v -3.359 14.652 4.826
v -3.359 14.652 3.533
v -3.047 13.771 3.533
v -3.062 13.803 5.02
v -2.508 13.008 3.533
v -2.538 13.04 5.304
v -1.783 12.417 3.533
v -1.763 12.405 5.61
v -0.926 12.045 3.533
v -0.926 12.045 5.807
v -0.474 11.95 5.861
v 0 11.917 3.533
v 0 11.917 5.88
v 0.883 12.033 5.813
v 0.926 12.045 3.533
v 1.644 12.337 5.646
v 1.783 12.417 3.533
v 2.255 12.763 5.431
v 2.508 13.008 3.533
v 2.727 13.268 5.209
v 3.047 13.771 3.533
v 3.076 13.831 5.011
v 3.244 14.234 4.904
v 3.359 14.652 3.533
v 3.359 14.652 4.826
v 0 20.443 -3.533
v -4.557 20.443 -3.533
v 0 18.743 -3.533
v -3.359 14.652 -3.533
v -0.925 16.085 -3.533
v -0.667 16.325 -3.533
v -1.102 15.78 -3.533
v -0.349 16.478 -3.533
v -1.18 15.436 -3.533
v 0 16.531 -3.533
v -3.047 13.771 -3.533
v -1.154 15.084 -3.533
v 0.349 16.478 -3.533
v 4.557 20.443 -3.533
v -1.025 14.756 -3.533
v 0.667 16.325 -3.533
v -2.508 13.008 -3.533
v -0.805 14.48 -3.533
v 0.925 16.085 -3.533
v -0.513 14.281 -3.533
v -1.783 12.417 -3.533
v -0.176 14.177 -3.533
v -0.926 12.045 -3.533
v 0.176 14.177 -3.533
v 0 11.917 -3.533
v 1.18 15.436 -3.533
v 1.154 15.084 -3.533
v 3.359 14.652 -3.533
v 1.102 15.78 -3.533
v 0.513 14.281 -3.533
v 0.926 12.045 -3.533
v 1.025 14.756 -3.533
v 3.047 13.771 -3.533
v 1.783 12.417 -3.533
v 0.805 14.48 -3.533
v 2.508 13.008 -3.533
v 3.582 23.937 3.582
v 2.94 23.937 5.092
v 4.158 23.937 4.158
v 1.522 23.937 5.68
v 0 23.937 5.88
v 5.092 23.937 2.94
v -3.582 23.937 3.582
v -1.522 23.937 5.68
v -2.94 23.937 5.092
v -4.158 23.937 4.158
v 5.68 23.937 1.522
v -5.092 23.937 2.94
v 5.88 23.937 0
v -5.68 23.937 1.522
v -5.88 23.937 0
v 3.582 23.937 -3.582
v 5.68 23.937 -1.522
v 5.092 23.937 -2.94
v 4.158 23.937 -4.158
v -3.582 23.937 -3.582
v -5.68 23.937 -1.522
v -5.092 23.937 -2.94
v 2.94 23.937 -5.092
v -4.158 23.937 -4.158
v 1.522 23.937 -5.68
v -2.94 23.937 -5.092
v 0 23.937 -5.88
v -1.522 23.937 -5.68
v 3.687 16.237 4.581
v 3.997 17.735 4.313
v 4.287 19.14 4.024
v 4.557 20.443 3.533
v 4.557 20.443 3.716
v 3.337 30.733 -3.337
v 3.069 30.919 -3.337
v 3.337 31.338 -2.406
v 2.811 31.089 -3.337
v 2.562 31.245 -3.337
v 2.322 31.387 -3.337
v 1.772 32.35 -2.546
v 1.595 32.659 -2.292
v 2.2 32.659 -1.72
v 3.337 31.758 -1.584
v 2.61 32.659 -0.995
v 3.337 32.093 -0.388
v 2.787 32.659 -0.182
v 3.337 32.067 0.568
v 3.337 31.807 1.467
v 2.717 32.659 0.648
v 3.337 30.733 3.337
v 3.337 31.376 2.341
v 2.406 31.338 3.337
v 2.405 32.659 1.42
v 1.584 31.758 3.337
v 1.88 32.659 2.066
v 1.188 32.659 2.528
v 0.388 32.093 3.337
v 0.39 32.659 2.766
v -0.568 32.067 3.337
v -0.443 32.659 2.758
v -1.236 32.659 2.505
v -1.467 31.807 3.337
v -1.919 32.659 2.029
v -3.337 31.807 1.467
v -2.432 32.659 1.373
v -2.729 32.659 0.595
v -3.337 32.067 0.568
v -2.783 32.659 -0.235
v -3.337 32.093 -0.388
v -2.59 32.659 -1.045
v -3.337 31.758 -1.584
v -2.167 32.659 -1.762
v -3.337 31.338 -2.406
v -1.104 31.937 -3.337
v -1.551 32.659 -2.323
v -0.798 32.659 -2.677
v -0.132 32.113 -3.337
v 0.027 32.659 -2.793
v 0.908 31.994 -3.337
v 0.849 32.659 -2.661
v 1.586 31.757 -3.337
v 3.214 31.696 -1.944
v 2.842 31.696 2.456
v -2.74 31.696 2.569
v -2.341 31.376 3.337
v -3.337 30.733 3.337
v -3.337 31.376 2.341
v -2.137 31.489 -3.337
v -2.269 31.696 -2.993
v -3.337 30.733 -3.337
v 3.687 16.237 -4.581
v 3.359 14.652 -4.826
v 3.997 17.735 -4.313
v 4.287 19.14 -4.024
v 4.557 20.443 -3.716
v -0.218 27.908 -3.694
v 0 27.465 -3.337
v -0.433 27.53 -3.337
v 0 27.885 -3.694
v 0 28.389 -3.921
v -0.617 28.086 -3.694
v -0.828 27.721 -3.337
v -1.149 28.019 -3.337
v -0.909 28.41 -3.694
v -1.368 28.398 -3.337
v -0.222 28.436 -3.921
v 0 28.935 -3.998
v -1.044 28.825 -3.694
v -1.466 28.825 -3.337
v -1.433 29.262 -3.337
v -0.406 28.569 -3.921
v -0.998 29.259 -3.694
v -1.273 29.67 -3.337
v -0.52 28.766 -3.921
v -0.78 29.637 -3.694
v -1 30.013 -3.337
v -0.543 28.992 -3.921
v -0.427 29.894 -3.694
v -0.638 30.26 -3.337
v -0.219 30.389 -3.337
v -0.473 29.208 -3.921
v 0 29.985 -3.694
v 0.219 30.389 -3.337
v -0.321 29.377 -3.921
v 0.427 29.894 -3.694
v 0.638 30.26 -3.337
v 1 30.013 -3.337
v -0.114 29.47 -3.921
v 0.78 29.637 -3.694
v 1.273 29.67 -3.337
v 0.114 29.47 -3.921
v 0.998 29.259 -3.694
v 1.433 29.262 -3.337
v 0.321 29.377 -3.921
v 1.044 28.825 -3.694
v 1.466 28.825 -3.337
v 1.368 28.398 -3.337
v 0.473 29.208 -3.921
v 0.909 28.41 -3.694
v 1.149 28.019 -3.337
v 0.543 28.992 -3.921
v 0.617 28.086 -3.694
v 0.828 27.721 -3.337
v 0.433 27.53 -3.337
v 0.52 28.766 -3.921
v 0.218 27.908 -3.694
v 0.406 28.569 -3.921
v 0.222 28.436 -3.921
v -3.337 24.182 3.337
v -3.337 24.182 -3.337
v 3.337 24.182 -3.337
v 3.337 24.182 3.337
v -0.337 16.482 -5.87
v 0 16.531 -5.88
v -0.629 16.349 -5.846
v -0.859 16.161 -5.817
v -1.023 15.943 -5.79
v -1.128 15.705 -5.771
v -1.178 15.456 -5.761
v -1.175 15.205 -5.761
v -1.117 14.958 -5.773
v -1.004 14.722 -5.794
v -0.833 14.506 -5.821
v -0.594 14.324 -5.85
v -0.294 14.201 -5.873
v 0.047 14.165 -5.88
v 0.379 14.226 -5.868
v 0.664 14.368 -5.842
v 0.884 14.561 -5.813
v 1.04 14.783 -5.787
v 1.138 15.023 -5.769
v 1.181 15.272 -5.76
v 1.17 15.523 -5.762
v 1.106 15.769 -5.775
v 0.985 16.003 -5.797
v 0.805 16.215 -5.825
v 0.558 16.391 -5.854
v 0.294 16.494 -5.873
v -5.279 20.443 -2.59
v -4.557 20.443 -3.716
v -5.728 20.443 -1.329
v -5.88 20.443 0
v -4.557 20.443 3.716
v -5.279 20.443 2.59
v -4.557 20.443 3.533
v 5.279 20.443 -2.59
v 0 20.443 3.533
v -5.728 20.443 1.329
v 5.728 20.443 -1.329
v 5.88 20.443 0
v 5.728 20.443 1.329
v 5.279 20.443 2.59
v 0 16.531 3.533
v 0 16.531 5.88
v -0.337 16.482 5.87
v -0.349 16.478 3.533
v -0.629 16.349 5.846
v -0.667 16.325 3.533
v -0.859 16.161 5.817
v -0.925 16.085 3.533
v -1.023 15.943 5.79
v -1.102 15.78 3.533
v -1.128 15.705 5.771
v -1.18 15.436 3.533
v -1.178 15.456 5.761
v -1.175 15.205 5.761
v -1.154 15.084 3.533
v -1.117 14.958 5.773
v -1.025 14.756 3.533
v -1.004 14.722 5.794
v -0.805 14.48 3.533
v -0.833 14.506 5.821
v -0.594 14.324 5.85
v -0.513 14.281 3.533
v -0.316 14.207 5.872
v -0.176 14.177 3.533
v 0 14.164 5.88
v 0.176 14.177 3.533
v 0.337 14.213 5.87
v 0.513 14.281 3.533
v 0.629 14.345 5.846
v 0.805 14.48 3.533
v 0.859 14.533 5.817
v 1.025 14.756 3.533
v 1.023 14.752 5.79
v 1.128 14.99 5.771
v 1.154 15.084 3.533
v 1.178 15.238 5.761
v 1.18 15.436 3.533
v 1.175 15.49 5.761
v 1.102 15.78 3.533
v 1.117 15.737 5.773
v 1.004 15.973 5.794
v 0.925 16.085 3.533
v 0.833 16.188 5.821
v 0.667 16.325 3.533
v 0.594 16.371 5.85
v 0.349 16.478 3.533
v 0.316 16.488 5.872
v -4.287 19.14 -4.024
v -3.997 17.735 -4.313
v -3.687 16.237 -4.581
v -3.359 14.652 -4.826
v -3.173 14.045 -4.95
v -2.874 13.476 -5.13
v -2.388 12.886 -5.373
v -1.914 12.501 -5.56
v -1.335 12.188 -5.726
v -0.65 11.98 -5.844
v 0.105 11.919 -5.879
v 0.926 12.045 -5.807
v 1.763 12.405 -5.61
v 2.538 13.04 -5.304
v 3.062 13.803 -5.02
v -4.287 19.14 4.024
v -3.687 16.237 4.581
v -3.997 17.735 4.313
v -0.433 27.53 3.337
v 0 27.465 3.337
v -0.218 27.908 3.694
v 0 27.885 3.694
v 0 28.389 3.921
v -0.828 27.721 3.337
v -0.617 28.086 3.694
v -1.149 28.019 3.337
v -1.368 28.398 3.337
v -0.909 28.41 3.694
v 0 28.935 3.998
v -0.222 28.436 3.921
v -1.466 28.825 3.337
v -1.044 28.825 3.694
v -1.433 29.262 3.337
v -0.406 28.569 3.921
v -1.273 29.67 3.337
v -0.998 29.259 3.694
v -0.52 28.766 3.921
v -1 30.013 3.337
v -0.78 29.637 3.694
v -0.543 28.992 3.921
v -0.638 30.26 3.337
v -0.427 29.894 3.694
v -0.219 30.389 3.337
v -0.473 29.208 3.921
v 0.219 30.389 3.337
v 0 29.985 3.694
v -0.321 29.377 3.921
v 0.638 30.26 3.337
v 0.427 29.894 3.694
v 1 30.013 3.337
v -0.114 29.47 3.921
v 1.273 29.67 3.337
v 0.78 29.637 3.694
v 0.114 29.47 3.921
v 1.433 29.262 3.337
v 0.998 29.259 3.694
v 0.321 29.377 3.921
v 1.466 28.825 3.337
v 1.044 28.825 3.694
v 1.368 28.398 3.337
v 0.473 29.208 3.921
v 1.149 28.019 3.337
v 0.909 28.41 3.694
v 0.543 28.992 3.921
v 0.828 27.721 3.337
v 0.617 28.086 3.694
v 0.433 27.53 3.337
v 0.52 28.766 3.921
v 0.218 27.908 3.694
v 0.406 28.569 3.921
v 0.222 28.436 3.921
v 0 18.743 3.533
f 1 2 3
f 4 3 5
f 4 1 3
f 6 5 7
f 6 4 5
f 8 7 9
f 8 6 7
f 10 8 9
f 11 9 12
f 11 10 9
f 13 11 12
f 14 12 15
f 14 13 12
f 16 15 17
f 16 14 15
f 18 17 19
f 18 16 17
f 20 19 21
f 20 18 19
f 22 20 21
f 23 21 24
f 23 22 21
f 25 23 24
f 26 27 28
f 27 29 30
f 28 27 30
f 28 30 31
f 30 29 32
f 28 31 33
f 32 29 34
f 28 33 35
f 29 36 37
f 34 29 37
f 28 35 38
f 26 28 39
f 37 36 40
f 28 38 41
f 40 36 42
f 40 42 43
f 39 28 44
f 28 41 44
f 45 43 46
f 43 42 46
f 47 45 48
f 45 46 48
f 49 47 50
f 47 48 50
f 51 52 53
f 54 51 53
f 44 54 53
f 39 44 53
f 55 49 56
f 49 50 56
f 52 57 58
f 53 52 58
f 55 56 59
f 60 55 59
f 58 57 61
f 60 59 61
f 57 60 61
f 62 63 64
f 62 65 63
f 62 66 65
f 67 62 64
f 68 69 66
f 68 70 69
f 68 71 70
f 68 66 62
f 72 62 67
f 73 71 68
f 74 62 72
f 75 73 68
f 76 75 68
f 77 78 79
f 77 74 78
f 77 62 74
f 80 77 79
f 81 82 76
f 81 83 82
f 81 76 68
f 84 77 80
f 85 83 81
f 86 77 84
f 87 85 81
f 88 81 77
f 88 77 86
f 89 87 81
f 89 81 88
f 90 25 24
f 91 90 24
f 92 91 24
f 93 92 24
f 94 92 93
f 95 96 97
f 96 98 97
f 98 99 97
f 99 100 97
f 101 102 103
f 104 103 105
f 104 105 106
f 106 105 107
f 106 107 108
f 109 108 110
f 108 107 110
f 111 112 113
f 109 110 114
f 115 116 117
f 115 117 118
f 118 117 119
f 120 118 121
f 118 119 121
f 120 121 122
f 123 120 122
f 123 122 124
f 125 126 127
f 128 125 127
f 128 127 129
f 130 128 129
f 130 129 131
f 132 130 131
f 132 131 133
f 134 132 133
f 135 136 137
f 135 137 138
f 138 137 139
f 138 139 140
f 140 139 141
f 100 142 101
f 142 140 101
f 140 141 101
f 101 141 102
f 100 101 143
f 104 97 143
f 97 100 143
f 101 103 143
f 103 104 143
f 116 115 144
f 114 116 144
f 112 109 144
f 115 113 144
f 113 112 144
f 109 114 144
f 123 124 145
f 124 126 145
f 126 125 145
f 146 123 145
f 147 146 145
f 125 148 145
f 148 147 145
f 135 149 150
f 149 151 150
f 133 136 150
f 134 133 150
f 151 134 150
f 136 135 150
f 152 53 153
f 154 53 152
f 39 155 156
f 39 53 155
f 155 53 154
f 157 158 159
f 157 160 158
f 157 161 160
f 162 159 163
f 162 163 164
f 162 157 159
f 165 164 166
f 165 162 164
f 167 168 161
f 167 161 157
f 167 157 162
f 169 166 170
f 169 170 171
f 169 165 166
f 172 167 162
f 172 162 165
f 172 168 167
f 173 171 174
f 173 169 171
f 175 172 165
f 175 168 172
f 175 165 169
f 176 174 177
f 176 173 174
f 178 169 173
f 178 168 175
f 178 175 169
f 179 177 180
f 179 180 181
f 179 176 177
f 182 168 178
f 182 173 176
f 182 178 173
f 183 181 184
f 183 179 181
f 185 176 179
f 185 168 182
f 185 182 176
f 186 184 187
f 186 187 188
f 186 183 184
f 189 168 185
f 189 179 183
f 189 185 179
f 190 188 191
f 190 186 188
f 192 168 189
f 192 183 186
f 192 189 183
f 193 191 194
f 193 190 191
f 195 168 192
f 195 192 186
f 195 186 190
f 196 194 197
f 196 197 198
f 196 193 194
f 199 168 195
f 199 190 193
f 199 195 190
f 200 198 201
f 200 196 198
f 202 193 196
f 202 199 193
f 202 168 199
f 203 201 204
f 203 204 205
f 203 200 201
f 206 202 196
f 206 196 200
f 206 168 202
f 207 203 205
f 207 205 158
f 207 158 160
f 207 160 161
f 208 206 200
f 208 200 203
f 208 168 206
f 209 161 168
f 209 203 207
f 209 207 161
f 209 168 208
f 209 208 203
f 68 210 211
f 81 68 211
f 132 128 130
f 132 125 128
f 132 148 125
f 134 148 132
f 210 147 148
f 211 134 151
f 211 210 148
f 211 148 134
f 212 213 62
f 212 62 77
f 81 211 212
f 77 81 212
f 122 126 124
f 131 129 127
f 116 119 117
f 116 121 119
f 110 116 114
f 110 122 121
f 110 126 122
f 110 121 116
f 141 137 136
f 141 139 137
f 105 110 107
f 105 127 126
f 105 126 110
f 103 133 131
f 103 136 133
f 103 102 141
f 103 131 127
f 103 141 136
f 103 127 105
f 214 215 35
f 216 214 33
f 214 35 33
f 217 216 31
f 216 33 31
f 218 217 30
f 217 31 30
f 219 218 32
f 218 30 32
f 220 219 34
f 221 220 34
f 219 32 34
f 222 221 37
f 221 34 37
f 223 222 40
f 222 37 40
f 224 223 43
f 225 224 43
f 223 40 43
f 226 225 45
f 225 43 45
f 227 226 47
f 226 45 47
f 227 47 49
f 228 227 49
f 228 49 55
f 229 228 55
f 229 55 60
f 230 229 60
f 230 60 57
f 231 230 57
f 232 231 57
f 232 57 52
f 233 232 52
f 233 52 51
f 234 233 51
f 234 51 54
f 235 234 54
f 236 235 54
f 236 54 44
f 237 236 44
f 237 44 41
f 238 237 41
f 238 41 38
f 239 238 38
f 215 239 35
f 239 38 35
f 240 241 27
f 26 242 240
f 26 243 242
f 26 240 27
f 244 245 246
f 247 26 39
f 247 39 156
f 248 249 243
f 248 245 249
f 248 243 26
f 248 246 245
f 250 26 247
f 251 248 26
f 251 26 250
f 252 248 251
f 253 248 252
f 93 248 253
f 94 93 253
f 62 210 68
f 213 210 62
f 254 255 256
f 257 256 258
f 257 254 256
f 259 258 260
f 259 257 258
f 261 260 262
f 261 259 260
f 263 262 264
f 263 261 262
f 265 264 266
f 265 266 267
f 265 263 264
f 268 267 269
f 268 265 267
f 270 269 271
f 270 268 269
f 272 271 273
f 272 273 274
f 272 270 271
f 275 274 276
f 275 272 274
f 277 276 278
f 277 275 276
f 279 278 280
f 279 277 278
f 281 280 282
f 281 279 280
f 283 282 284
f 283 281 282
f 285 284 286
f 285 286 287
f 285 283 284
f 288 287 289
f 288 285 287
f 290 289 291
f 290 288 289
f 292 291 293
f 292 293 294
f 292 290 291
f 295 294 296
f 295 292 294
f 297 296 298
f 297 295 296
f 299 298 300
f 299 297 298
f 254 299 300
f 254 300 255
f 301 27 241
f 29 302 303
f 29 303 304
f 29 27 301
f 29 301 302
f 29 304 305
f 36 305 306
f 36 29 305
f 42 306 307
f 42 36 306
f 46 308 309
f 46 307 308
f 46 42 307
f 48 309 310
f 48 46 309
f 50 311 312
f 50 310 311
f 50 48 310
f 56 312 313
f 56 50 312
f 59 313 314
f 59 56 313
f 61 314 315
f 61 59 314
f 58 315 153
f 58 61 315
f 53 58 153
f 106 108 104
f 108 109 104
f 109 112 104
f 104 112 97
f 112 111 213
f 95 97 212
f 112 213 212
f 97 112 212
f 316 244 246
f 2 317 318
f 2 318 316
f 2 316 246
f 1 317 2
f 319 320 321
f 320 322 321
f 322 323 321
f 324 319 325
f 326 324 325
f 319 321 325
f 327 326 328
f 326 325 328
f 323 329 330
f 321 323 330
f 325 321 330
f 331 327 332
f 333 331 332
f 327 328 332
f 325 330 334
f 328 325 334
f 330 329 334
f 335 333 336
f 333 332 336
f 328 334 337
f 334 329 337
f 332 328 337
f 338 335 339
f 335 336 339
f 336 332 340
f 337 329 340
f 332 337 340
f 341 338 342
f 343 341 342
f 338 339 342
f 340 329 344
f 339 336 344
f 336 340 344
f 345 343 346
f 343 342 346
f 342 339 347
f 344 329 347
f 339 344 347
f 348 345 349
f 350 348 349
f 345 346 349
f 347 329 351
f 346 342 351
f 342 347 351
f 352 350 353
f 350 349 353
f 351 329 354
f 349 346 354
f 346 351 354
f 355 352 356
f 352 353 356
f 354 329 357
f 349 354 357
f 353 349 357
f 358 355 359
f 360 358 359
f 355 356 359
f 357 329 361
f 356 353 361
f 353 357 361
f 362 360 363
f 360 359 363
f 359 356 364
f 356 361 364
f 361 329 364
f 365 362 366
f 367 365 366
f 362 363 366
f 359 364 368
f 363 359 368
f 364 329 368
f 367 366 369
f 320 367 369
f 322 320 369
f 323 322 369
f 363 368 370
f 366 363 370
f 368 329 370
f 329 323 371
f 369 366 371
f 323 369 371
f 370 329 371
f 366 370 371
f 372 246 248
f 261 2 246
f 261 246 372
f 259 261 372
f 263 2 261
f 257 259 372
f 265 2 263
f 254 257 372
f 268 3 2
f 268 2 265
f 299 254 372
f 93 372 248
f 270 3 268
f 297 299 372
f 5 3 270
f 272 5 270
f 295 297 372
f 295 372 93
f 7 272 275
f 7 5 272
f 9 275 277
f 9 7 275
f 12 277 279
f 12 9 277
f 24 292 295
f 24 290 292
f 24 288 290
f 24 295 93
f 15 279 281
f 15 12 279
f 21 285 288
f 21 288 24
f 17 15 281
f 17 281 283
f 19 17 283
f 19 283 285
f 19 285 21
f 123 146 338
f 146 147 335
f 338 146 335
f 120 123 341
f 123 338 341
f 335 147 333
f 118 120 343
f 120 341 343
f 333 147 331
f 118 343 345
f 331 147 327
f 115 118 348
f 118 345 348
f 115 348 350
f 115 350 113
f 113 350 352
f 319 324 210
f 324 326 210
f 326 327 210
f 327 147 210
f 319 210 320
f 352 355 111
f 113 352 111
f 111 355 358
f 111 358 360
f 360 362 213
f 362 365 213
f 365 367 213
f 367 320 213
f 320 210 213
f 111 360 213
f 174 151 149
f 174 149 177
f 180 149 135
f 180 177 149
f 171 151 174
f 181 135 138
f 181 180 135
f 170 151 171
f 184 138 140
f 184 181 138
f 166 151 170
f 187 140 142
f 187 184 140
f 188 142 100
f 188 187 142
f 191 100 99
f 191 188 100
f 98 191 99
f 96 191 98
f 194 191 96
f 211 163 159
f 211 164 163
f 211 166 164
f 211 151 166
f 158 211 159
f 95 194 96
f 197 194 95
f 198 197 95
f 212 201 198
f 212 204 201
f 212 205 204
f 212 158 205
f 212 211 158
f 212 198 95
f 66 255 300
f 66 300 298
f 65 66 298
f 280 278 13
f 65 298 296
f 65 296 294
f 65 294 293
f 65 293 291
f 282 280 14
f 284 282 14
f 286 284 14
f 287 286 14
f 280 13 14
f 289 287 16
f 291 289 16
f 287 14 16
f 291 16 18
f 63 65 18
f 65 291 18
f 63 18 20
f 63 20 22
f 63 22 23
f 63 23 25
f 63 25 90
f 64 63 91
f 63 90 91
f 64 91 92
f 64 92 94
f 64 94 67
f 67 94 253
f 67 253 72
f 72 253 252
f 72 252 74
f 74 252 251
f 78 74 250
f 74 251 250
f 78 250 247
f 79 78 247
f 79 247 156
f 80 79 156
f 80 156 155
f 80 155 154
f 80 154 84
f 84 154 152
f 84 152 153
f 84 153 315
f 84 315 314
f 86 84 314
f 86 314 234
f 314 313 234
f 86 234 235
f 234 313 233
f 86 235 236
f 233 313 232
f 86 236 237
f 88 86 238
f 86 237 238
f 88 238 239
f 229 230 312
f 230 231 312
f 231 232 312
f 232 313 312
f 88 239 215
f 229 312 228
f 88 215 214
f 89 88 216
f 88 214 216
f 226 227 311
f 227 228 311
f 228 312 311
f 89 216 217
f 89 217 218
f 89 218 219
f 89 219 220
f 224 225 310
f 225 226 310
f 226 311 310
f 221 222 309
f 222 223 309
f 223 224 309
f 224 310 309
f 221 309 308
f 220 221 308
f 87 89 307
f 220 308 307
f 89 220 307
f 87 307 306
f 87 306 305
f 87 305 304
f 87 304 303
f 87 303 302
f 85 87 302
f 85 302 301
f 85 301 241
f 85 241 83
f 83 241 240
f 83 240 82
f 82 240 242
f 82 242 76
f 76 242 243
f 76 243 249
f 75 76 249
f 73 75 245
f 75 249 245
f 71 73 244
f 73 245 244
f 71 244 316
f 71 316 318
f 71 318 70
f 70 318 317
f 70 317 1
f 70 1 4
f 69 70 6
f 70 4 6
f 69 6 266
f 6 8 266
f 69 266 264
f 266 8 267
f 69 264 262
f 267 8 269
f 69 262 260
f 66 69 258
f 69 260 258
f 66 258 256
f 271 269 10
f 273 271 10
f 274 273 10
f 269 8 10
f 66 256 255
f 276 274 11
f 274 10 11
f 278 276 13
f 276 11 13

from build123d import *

# Parameters (mm, degrees)
SKETCH1_R           = 12
BOSS_EXTRUDE1_DEPTH = 33.53
CUT_EXTRUDE1_DEPTH  = 19.6
CHAMFER1_SIZE       = 0.4
SKETCH3_R           = 9.375
CUT_EXTRUDE2_DEPTH  = 3.4
CUT_EXTRUDE2_DRAFT  = -35
SKETCH4_W           = 24
SKETCH4_H           = 14.42225279
CUT_EXTRUDE3_DEPTH  = 17.4
SKETCH5_R           = 2.415
CUT_EXTRUDE4_DEPTH  = 33.7
CUT_EXTRUDE5_START  = -9
SKETCH6_R           = 12
CUT_EXTRUDE5_DEPTH  = 9
BOSS_EXTRUDE2_START = -7.13
SKETCH7_R           = 12
BOSS_EXTRUDE2_DEPTH = 7.13
SKETCH8_W           = 13.62
SKETCH8_H           = 13.62
BOSS_EXTRUDE3_DEPTH = 17.8
CHAMFER2_SIZE       = 0.5
SCALE1_SCALE        = 0.49


with BuildPart() as part:
    # Sketch1 → Boss-Extrude1 (new body)
    with BuildSketch(Plane(origin=(0, 0, 0), x_dir=(1, 0, 0), z_dir=(0, 1, 0))):
        with Locations(Location((0, 0, 0), (0, 0, 270))):
            Circle(SKETCH1_R)
    extrude(amount=BOSS_EXTRUDE1_DEPTH)

    # Sketch2 → Cut-Extrude1 (cut)
    with BuildSketch(Plane(origin=(0, 33.53, 0), x_dir=(1, 0, 0), z_dir=(0, 1, 0))):
        with BuildLine():
            Line((-6.5, 6.5), (-2.5, 6.5))
            ThreePointArc((-2.5, 6.5), (0, 7.211126395), (2.5, 6.5))
            Line((2.5, 6.5), (6.5, 6.5))
            Line((6.5, 6.5), (6.5, 2.5))
            ThreePointArc((6.5, 2.5), (7.211126395, 0), (6.5, -2.5))
            Line((6.5, -2.5), (6.5, -6.5))
            Line((6.5, -6.5), (2.5, -6.5))
            ThreePointArc((2.5, -6.5), (0, -7.211126395), (-2.5, -6.5))
            Line((-2.5, -6.5), (-6.5, -6.5))
            Line((-6.5, -6.5), (-6.5, -2.5))
            ThreePointArc((-6.5, -2.5), (-7.211126395, 0), (-6.5, 2.5))
            Line((-6.5, 2.5), (-6.5, 6.5))
        make_face()
    extrude(amount=-CUT_EXTRUDE1_DEPTH, mode=Mode.SUBTRACT)

    # Chamfer1
    chamfer1_edges = [part.edges().sort_by_distance(p)[0] for p in [
        (-6.5, 23.73, -6.5),
        (6.5, 23.73, -6.5),
        (6.5, 23.73, 6.5),
        (-6.5, 23.73, 6.5),
    ]]
    chamfer(chamfer1_edges, length=CHAMFER1_SIZE)


with BuildPart() as cut_extrude2_tool:
    # Sketch3 → Cut-Extrude2 (with draft: the straight prism first)
    with BuildSketch(Plane(origin=(0, 33.53, 0), x_dir=(1, 0, 0), z_dir=(0, 1, 0))):
        Circle(SKETCH3_R)
    extrude(amount=-CUT_EXTRUDE2_DEPTH)
    # Cut-Extrude2: the draft: its side faces are tilted about the plane it starts from
    cut_extrude2_sides = [cut_extrude2_tool.faces().sort_by_distance(p)[0] for p in [
        (-9.375, 31.83, 0),
    ]]
    draft(cut_extrude2_sides, Plane(origin=(0, 33.53, 0), x_dir=(1, 0, 0), z_dir=(0, 1, 0)), CUT_EXTRUDE2_DRAFT)


with BuildPart() as part_1:
    add(part.part)

    # Cut-Extrude2: cut by cut_extrude2_tool
    add(cut_extrude2_tool.part, mode=Mode.SUBTRACT)

    # Sketch4 → Cut-Extrude3 (cut)
    with BuildSketch(Plane.XZ):
        Rectangle(SKETCH4_W, SKETCH4_H)
    extrude(amount=-CUT_EXTRUDE3_DEPTH, mode=Mode.SUBTRACT)

    # Sketch5 → Cut-Extrude4 (cut, symmetric)
    with BuildSketch(Plane.XY):
        with Locations(Location((0, 7, 0), (0, 0, 90))):
            Circle(SKETCH5_R)
        with BuildLine():
            ThreePointArc((-6.854820161, 5.581747356), (0, 0), (6.854820161, 5.581747356))
            Line((6.854820161, 5.581747356), (9.3, 17.4))
            Line((9.3, 17.4), (12, 17.4))
            Line((12, 17.4), (12, -3.192277431))
            Line((12, -3.192277431), (-12, -3.192277431))
            Line((-12, -3.192277431), (-12, 17.4))
            Line((-12, 17.4), (-9.3, 17.4))
            Line((-9.3, 17.4), (-6.854820161, 5.581747356))
        make_face()
    extrude(amount=CUT_EXTRUDE4_DEPTH, both=True, mode=Mode.SUBTRACT)

    # Sketch6 → Cut-Extrude5 (cut)
    with BuildSketch(Plane(origin=(0, 33.53, 0), x_dir=(1, 0, 0), z_dir=(0, 1, 0)).offset(CUT_EXTRUDE5_START)):
        with Locations(Location((0, 0, 0), (0, 0, 55.16360803))):
            Circle(SKETCH6_R)
    extrude(amount=CUT_EXTRUDE5_DEPTH, mode=Mode.SUBTRACT)

    # Sketch7 → Boss-Extrude2 (add)
    with BuildSketch(Plane(origin=(0, 24.53, 0), x_dir=(1, 0, 0), z_dir=(0, 1, 0)).offset(BOSS_EXTRUDE2_START)):
        with Locations(Location((0, 0, 0), (0, 0, 55.16360803))):
            Circle(SKETCH7_R)
    extrude(amount=BOSS_EXTRUDE2_DEPTH)

    # Sketch8 → Boss-Extrude3 (add)
    with BuildSketch(Plane(origin=(0, 24.53, 0), x_dir=(1, 0, 0), z_dir=(0, 1, 0))):
        Rectangle(SKETCH8_W, SKETCH8_H)
    extrude(amount=BOSS_EXTRUDE3_DEPTH)

    # Sketch9 → Cut-Revolve1 (revolve, cut)
    with BuildSketch(Plane.XY, mode=Mode.PRIVATE) as cut_revolve1_sk:
        Polygon((5.7, 42.33), (13.111265215, 42.33), (13.111265215, 34.918734785), align=None)
    revolve(cut_revolve1_sk.sketch.rotate(Axis((0, 44.4465, 0), (0, -1, 0)), 304.83639197), axis=Axis((0, 44.4465, 0), (0, -1, 0)), mode=Mode.SUBTRACT)

    # Chamfer2
    chamfer2_edges = [part_1.edges().sort_by_distance(p)[0] for p in [
        (6.81, 24.53, 0),
        (0, 24.53, -6.81),
        (-6.81, 24.53, 0),
        (0, 24.53, 6.81),
    ]]
    chamfer(chamfer2_edges, length=CHAMFER2_SIZE)

    # Sketch10 → Revolve1 (revolve)
    with BuildSketch(Plane(origin=(0, 0, 0), x_dir=(0, 0, -1), z_dir=(1, 0, 0))):
        with BuildLine():
            Line((6.81, 34.73), (6.81, 31.73))
            ThreePointArc((6.81, 31.73), (7.806952033, 33.085121585), (8.16, 34.73))
            Line((8.16, 34.73), (6.81, 34.73))
        make_face()
    revolve1 = revolve(axis=Axis((0, 34.73, -6.81), (0, 0, -1)))

    # Mirror1: Revolve1 across plane
    add(revolve1.mirror(Plane.XY))


with BuildPart() as part_2:
    # Scale1: scaled about (-1.67e-07, 23.367427714, 2.93e-06)
    add(part_1.part.scale(SCALE1_SCALE).moved(Location((-8.5e-08, 11.917388134, 1.494e-06))))


solid = part_2.part
